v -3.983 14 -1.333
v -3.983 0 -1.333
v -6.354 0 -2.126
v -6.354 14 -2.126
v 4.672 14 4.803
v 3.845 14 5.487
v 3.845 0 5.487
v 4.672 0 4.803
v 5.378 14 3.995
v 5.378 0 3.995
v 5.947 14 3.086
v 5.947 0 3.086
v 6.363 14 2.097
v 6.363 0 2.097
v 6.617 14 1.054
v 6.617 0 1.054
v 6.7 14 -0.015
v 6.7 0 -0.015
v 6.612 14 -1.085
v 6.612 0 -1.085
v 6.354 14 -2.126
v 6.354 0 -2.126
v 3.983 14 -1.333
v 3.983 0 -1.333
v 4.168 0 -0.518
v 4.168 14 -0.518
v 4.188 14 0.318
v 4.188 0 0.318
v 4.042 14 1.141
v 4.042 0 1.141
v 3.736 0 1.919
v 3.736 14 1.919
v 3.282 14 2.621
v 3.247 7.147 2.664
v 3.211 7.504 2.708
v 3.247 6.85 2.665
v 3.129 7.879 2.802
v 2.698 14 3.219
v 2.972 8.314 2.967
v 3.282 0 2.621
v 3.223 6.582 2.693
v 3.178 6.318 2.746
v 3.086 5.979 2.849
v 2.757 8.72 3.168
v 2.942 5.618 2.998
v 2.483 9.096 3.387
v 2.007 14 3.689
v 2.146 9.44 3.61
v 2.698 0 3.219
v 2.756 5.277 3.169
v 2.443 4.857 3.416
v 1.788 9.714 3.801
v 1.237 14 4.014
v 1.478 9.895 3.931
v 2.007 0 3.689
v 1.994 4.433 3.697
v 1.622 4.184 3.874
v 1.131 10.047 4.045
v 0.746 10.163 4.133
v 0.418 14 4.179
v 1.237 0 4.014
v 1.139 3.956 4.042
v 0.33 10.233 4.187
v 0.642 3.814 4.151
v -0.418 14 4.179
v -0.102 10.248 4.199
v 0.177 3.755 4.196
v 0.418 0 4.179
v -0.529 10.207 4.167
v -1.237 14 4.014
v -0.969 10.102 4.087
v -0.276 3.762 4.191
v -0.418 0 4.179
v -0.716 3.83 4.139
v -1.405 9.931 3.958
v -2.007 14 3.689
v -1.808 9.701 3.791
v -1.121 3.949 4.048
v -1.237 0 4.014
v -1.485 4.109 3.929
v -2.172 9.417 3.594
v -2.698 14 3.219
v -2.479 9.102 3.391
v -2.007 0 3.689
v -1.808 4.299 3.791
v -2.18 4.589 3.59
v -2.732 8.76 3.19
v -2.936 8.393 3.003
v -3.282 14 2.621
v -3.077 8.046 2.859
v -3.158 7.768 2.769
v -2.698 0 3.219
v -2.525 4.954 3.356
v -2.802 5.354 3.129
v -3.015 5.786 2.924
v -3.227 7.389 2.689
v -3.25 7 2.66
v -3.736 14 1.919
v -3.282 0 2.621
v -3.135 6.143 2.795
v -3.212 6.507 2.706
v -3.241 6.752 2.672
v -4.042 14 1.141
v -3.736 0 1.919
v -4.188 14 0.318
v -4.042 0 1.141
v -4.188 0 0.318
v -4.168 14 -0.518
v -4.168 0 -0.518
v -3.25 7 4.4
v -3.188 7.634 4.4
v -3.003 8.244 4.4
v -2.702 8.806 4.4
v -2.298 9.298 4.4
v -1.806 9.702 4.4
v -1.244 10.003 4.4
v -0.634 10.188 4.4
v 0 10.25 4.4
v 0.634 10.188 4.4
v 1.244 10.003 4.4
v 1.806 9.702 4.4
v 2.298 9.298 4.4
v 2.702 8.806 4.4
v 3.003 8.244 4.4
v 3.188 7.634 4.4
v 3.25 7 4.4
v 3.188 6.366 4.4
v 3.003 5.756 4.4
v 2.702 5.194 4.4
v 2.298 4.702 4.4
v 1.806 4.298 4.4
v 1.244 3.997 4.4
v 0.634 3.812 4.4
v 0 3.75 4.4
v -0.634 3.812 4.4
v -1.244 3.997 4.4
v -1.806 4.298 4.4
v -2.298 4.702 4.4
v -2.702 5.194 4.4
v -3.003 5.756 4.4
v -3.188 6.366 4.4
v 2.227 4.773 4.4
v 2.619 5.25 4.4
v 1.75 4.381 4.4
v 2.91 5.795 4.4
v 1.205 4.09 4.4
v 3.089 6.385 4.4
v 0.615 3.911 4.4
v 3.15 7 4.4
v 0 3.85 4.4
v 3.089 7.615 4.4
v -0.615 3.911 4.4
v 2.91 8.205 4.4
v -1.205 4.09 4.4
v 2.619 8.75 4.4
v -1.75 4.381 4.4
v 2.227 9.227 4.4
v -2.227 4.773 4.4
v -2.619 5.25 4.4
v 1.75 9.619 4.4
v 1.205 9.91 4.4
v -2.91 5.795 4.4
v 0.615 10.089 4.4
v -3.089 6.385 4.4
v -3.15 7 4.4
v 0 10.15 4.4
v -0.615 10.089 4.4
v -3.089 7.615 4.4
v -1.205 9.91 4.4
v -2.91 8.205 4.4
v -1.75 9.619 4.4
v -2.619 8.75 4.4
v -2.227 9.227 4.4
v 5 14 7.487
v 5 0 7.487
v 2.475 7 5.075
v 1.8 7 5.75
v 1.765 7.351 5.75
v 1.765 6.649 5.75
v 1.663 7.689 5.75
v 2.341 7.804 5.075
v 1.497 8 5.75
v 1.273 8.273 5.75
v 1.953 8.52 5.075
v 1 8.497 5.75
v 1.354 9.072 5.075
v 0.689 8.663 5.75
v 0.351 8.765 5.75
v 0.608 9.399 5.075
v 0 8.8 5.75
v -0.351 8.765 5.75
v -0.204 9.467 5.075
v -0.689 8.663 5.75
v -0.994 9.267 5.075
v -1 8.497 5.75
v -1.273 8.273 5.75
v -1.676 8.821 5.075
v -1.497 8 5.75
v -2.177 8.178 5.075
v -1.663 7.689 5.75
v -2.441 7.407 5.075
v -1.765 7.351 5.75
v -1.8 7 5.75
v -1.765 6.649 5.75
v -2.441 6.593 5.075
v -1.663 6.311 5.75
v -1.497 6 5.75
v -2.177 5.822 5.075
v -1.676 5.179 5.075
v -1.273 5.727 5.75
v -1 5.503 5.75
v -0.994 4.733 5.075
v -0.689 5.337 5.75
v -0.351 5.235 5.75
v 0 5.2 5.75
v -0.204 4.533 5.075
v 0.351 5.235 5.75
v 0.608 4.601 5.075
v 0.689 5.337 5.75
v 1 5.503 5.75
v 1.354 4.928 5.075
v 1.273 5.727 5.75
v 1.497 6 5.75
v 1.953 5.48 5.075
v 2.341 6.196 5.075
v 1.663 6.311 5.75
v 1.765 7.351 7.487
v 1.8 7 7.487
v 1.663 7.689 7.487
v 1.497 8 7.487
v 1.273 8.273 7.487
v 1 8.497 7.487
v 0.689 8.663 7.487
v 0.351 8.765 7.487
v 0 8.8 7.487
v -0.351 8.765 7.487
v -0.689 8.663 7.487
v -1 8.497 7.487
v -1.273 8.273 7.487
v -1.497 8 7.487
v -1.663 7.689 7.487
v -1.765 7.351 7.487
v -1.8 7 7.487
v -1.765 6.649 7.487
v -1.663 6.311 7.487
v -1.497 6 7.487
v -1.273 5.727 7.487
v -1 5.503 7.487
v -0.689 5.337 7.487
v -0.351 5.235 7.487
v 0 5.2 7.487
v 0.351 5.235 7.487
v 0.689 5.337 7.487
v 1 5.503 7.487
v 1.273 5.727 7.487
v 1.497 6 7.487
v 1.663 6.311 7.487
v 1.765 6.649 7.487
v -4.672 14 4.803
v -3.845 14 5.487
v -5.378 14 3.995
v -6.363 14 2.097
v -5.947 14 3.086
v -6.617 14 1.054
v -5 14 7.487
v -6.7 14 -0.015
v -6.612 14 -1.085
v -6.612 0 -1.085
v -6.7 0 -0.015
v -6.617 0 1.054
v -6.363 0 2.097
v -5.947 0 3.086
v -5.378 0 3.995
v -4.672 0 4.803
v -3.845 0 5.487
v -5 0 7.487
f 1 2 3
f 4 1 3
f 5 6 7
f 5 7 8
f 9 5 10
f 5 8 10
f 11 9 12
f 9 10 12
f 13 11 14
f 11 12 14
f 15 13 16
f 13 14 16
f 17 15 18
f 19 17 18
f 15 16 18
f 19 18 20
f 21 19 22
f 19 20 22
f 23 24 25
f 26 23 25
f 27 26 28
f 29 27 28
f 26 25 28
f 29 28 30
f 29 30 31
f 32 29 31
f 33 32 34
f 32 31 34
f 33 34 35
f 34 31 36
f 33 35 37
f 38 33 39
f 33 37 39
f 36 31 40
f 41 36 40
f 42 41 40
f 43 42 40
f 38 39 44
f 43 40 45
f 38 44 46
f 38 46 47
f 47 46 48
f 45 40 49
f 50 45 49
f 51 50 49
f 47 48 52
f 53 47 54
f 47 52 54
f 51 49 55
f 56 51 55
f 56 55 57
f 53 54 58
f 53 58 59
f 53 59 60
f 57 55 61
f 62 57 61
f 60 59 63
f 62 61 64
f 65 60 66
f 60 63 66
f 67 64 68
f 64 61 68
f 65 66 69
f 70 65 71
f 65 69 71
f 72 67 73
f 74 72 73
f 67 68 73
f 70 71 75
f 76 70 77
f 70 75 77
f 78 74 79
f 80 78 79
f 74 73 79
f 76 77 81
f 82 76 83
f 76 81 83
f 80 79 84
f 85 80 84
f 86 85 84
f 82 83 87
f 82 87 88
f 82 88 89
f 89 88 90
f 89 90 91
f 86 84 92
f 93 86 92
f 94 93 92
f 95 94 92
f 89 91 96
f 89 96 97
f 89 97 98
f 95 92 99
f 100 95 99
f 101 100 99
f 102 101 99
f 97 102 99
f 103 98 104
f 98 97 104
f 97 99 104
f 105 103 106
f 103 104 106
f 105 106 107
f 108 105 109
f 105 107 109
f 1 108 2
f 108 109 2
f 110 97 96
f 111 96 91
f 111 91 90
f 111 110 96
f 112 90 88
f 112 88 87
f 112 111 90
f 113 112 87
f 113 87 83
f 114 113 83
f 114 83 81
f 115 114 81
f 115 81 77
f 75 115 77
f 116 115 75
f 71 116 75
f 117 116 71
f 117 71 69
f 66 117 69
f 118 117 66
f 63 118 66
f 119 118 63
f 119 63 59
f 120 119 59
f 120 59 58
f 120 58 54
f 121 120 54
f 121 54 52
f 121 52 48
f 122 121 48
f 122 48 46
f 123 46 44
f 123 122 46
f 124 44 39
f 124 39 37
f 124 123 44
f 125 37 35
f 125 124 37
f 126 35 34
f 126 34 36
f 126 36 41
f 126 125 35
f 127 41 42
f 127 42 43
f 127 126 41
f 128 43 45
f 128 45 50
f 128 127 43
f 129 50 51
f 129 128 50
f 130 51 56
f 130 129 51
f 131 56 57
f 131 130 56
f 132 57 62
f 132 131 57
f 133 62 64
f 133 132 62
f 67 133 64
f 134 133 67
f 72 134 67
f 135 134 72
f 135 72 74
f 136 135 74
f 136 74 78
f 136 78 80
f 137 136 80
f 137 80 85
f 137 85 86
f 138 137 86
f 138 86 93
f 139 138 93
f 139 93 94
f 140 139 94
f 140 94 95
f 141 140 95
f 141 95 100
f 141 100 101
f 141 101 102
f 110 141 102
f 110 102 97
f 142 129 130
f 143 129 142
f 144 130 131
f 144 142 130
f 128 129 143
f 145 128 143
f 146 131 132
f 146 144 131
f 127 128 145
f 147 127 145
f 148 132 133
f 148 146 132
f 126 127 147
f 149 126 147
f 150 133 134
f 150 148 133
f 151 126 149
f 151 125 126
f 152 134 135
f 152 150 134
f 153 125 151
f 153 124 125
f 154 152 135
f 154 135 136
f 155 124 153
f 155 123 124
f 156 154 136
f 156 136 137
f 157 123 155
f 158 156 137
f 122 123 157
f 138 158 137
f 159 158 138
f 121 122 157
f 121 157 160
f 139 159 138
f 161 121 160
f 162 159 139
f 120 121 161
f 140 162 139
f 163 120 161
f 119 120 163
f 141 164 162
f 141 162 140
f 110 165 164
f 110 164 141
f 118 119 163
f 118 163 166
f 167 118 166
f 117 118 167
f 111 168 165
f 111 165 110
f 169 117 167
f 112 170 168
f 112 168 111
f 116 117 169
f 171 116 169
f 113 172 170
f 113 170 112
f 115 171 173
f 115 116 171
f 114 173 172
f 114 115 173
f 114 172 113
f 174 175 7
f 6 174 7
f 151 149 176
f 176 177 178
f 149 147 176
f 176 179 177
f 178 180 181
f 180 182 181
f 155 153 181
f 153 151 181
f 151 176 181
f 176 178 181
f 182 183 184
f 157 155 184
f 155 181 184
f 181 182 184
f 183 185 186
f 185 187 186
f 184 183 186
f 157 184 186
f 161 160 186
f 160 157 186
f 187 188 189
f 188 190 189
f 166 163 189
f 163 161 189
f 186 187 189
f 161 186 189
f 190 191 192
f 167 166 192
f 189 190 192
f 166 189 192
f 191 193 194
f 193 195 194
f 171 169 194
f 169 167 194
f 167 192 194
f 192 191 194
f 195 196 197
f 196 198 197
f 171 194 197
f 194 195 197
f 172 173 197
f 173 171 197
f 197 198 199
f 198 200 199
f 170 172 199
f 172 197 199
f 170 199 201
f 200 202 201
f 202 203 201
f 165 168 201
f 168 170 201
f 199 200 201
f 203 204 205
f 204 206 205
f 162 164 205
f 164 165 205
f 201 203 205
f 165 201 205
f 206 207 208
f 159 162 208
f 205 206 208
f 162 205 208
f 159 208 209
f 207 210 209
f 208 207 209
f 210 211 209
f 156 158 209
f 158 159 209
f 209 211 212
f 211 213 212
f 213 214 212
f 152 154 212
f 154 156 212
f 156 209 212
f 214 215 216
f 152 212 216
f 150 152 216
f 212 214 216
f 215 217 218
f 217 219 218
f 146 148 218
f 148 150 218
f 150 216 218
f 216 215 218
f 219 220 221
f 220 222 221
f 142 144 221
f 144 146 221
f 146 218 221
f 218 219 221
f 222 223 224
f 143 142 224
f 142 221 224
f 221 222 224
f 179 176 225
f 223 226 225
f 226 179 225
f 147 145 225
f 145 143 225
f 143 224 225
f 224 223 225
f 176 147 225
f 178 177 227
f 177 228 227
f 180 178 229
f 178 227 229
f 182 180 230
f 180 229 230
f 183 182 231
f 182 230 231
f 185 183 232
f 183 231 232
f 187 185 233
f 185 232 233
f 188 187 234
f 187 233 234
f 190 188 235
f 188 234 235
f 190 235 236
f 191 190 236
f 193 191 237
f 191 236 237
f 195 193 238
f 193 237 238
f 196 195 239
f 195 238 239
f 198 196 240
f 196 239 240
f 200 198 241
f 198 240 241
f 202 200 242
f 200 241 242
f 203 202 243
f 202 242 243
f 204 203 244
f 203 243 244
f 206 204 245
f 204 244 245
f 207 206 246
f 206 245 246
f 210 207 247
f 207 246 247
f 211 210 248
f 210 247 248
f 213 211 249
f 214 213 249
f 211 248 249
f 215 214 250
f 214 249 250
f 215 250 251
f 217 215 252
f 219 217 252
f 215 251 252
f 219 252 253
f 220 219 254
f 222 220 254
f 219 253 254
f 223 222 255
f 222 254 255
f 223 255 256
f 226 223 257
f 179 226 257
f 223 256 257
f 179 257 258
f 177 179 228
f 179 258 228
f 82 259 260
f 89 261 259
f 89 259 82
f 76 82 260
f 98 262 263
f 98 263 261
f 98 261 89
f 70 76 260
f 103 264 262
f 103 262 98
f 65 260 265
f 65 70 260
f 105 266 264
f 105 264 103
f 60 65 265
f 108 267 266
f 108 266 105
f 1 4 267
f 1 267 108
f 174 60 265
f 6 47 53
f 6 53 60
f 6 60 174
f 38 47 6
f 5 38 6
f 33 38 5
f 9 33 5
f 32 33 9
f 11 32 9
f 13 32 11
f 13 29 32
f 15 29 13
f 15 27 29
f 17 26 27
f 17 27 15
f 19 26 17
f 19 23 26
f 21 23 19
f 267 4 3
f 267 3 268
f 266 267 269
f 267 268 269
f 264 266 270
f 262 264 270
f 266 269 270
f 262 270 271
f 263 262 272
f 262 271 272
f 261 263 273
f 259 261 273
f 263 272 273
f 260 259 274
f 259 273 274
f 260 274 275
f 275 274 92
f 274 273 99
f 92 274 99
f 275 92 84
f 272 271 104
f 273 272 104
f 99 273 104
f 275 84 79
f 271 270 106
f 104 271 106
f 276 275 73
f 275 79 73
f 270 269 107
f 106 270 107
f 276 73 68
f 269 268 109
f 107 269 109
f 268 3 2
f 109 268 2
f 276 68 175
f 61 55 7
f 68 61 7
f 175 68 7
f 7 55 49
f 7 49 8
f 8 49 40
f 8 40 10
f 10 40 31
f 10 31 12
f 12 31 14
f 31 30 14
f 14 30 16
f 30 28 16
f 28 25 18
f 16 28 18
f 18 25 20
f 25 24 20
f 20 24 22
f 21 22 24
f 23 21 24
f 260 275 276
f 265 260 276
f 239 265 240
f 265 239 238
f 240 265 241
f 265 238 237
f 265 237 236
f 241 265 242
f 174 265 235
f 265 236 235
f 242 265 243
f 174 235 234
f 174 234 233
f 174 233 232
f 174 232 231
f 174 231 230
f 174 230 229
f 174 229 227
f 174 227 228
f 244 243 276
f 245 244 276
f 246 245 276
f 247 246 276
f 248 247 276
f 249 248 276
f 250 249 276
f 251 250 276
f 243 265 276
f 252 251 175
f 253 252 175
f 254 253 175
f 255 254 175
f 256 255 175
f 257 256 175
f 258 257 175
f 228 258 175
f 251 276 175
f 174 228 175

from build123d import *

# Parameters (mm, degrees)
BOSS_EXTRUDE1_DEPTH                             = 14
CUT_EXTRUDE1_DEPTH                              = 17.760296299
CUT_EXTRUDE1_DEPTH_BACK                         = 0.2
SKETCH4_R                                       = 3.25
CSK_FOR_M3_FLAT_HEAD_MACHINE_SCREW4_D           = 3.6
CSK_FOR_M3_FLAT_HEAD_MACHINE_SCREW4_DEPTH       = 7.5
CSK_FOR_M3_FLAT_HEAD_MACHINE_SCREW4_CSINK_D     = 6.3
CSK_FOR_M3_FLAT_HEAD_MACHINE_SCREW4_CSINK_ANGLE = 90
CSK_FOR_M3_FLAT_HEAD_MACHINE_SCREW4_TIP         = 1.081549114


with BuildPart() as part:
    # Sketch1 → Boss-Extrude1 (new body)
    with BuildSketch(Plane(origin=(0, 0, 0), x_dir=(1, 0, 0), z_dir=(0, 1, 0))):
        with BuildLine():
            Line((-5, -7.486681333), (5, -7.486681333))
            Line((5, -7.486681333), (3.845299462, -5.486681333))
            ThreePointArc((3.845299462, -5.486681333), (6.363430853, -2.096842336), (6.35376849, 2.125941198))
            Line((6.35376849, 2.125941198), (3.982959352, 1.332679557))
            ThreePointArc((3.982959352, 1.332679557), (0, -4.2), (-3.982959352, 1.332679557))
            Line((-3.982959352, 1.332679557), (-6.35376849, 2.125941198))
            ThreePointArc((-6.35376849, 2.125941198), (-6.363430853, -2.096842336), (-3.845299462, -5.486681333))
            Line((-3.845299462, -5.486681333), (-5, -7.486681333))
        make_face()
    extrude(amount=BOSS_EXTRUDE1_DEPTH)

    # Sketch4 → Cut-Extrude1 (cut, two sides: drawn at the far end of the back side and taken through both)
    with BuildSketch(Plane(origin=(0, 0, 4.2), x_dir=(-1, 0, 0), z_dir=(0, 0, -1)).offset(-CUT_EXTRUDE1_DEPTH_BACK)):
        with Locations((0, 7)):
            Circle(SKETCH4_R)
    extrude(amount=CUT_EXTRUDE1_DEPTH + CUT_EXTRUDE1_DEPTH_BACK, mode=Mode.SUBTRACT)

    # CSK for M3 Flat Head Machine Screw4
    with Locations(Plane(origin=(0, 0, 4.4), x_dir=(-1, 0, 0), z_dir=(0, 0, -1))):
        with Locations((0, 7)):
            CounterSinkHole(CSK_FOR_M3_FLAT_HEAD_MACHINE_SCREW4_D / 2, CSK_FOR_M3_FLAT_HEAD_MACHINE_SCREW4_CSINK_D / 2, depth=CSK_FOR_M3_FLAT_HEAD_MACHINE_SCREW4_DEPTH, counter_sink_angle=CSK_FOR_M3_FLAT_HEAD_MACHINE_SCREW4_CSINK_ANGLE)
            with Locations((0, 0, -(CSK_FOR_M3_FLAT_HEAD_MACHINE_SCREW4_DEPTH + CSK_FOR_M3_FLAT_HEAD_MACHINE_SCREW4_TIP / 2))):  # 118° drill point
                Cone(0, CSK_FOR_M3_FLAT_HEAD_MACHINE_SCREW4_D / 2, CSK_FOR_M3_FLAT_HEAD_MACHINE_SCREW4_TIP, mode=Mode.SUBTRACT)


solid = part.part
